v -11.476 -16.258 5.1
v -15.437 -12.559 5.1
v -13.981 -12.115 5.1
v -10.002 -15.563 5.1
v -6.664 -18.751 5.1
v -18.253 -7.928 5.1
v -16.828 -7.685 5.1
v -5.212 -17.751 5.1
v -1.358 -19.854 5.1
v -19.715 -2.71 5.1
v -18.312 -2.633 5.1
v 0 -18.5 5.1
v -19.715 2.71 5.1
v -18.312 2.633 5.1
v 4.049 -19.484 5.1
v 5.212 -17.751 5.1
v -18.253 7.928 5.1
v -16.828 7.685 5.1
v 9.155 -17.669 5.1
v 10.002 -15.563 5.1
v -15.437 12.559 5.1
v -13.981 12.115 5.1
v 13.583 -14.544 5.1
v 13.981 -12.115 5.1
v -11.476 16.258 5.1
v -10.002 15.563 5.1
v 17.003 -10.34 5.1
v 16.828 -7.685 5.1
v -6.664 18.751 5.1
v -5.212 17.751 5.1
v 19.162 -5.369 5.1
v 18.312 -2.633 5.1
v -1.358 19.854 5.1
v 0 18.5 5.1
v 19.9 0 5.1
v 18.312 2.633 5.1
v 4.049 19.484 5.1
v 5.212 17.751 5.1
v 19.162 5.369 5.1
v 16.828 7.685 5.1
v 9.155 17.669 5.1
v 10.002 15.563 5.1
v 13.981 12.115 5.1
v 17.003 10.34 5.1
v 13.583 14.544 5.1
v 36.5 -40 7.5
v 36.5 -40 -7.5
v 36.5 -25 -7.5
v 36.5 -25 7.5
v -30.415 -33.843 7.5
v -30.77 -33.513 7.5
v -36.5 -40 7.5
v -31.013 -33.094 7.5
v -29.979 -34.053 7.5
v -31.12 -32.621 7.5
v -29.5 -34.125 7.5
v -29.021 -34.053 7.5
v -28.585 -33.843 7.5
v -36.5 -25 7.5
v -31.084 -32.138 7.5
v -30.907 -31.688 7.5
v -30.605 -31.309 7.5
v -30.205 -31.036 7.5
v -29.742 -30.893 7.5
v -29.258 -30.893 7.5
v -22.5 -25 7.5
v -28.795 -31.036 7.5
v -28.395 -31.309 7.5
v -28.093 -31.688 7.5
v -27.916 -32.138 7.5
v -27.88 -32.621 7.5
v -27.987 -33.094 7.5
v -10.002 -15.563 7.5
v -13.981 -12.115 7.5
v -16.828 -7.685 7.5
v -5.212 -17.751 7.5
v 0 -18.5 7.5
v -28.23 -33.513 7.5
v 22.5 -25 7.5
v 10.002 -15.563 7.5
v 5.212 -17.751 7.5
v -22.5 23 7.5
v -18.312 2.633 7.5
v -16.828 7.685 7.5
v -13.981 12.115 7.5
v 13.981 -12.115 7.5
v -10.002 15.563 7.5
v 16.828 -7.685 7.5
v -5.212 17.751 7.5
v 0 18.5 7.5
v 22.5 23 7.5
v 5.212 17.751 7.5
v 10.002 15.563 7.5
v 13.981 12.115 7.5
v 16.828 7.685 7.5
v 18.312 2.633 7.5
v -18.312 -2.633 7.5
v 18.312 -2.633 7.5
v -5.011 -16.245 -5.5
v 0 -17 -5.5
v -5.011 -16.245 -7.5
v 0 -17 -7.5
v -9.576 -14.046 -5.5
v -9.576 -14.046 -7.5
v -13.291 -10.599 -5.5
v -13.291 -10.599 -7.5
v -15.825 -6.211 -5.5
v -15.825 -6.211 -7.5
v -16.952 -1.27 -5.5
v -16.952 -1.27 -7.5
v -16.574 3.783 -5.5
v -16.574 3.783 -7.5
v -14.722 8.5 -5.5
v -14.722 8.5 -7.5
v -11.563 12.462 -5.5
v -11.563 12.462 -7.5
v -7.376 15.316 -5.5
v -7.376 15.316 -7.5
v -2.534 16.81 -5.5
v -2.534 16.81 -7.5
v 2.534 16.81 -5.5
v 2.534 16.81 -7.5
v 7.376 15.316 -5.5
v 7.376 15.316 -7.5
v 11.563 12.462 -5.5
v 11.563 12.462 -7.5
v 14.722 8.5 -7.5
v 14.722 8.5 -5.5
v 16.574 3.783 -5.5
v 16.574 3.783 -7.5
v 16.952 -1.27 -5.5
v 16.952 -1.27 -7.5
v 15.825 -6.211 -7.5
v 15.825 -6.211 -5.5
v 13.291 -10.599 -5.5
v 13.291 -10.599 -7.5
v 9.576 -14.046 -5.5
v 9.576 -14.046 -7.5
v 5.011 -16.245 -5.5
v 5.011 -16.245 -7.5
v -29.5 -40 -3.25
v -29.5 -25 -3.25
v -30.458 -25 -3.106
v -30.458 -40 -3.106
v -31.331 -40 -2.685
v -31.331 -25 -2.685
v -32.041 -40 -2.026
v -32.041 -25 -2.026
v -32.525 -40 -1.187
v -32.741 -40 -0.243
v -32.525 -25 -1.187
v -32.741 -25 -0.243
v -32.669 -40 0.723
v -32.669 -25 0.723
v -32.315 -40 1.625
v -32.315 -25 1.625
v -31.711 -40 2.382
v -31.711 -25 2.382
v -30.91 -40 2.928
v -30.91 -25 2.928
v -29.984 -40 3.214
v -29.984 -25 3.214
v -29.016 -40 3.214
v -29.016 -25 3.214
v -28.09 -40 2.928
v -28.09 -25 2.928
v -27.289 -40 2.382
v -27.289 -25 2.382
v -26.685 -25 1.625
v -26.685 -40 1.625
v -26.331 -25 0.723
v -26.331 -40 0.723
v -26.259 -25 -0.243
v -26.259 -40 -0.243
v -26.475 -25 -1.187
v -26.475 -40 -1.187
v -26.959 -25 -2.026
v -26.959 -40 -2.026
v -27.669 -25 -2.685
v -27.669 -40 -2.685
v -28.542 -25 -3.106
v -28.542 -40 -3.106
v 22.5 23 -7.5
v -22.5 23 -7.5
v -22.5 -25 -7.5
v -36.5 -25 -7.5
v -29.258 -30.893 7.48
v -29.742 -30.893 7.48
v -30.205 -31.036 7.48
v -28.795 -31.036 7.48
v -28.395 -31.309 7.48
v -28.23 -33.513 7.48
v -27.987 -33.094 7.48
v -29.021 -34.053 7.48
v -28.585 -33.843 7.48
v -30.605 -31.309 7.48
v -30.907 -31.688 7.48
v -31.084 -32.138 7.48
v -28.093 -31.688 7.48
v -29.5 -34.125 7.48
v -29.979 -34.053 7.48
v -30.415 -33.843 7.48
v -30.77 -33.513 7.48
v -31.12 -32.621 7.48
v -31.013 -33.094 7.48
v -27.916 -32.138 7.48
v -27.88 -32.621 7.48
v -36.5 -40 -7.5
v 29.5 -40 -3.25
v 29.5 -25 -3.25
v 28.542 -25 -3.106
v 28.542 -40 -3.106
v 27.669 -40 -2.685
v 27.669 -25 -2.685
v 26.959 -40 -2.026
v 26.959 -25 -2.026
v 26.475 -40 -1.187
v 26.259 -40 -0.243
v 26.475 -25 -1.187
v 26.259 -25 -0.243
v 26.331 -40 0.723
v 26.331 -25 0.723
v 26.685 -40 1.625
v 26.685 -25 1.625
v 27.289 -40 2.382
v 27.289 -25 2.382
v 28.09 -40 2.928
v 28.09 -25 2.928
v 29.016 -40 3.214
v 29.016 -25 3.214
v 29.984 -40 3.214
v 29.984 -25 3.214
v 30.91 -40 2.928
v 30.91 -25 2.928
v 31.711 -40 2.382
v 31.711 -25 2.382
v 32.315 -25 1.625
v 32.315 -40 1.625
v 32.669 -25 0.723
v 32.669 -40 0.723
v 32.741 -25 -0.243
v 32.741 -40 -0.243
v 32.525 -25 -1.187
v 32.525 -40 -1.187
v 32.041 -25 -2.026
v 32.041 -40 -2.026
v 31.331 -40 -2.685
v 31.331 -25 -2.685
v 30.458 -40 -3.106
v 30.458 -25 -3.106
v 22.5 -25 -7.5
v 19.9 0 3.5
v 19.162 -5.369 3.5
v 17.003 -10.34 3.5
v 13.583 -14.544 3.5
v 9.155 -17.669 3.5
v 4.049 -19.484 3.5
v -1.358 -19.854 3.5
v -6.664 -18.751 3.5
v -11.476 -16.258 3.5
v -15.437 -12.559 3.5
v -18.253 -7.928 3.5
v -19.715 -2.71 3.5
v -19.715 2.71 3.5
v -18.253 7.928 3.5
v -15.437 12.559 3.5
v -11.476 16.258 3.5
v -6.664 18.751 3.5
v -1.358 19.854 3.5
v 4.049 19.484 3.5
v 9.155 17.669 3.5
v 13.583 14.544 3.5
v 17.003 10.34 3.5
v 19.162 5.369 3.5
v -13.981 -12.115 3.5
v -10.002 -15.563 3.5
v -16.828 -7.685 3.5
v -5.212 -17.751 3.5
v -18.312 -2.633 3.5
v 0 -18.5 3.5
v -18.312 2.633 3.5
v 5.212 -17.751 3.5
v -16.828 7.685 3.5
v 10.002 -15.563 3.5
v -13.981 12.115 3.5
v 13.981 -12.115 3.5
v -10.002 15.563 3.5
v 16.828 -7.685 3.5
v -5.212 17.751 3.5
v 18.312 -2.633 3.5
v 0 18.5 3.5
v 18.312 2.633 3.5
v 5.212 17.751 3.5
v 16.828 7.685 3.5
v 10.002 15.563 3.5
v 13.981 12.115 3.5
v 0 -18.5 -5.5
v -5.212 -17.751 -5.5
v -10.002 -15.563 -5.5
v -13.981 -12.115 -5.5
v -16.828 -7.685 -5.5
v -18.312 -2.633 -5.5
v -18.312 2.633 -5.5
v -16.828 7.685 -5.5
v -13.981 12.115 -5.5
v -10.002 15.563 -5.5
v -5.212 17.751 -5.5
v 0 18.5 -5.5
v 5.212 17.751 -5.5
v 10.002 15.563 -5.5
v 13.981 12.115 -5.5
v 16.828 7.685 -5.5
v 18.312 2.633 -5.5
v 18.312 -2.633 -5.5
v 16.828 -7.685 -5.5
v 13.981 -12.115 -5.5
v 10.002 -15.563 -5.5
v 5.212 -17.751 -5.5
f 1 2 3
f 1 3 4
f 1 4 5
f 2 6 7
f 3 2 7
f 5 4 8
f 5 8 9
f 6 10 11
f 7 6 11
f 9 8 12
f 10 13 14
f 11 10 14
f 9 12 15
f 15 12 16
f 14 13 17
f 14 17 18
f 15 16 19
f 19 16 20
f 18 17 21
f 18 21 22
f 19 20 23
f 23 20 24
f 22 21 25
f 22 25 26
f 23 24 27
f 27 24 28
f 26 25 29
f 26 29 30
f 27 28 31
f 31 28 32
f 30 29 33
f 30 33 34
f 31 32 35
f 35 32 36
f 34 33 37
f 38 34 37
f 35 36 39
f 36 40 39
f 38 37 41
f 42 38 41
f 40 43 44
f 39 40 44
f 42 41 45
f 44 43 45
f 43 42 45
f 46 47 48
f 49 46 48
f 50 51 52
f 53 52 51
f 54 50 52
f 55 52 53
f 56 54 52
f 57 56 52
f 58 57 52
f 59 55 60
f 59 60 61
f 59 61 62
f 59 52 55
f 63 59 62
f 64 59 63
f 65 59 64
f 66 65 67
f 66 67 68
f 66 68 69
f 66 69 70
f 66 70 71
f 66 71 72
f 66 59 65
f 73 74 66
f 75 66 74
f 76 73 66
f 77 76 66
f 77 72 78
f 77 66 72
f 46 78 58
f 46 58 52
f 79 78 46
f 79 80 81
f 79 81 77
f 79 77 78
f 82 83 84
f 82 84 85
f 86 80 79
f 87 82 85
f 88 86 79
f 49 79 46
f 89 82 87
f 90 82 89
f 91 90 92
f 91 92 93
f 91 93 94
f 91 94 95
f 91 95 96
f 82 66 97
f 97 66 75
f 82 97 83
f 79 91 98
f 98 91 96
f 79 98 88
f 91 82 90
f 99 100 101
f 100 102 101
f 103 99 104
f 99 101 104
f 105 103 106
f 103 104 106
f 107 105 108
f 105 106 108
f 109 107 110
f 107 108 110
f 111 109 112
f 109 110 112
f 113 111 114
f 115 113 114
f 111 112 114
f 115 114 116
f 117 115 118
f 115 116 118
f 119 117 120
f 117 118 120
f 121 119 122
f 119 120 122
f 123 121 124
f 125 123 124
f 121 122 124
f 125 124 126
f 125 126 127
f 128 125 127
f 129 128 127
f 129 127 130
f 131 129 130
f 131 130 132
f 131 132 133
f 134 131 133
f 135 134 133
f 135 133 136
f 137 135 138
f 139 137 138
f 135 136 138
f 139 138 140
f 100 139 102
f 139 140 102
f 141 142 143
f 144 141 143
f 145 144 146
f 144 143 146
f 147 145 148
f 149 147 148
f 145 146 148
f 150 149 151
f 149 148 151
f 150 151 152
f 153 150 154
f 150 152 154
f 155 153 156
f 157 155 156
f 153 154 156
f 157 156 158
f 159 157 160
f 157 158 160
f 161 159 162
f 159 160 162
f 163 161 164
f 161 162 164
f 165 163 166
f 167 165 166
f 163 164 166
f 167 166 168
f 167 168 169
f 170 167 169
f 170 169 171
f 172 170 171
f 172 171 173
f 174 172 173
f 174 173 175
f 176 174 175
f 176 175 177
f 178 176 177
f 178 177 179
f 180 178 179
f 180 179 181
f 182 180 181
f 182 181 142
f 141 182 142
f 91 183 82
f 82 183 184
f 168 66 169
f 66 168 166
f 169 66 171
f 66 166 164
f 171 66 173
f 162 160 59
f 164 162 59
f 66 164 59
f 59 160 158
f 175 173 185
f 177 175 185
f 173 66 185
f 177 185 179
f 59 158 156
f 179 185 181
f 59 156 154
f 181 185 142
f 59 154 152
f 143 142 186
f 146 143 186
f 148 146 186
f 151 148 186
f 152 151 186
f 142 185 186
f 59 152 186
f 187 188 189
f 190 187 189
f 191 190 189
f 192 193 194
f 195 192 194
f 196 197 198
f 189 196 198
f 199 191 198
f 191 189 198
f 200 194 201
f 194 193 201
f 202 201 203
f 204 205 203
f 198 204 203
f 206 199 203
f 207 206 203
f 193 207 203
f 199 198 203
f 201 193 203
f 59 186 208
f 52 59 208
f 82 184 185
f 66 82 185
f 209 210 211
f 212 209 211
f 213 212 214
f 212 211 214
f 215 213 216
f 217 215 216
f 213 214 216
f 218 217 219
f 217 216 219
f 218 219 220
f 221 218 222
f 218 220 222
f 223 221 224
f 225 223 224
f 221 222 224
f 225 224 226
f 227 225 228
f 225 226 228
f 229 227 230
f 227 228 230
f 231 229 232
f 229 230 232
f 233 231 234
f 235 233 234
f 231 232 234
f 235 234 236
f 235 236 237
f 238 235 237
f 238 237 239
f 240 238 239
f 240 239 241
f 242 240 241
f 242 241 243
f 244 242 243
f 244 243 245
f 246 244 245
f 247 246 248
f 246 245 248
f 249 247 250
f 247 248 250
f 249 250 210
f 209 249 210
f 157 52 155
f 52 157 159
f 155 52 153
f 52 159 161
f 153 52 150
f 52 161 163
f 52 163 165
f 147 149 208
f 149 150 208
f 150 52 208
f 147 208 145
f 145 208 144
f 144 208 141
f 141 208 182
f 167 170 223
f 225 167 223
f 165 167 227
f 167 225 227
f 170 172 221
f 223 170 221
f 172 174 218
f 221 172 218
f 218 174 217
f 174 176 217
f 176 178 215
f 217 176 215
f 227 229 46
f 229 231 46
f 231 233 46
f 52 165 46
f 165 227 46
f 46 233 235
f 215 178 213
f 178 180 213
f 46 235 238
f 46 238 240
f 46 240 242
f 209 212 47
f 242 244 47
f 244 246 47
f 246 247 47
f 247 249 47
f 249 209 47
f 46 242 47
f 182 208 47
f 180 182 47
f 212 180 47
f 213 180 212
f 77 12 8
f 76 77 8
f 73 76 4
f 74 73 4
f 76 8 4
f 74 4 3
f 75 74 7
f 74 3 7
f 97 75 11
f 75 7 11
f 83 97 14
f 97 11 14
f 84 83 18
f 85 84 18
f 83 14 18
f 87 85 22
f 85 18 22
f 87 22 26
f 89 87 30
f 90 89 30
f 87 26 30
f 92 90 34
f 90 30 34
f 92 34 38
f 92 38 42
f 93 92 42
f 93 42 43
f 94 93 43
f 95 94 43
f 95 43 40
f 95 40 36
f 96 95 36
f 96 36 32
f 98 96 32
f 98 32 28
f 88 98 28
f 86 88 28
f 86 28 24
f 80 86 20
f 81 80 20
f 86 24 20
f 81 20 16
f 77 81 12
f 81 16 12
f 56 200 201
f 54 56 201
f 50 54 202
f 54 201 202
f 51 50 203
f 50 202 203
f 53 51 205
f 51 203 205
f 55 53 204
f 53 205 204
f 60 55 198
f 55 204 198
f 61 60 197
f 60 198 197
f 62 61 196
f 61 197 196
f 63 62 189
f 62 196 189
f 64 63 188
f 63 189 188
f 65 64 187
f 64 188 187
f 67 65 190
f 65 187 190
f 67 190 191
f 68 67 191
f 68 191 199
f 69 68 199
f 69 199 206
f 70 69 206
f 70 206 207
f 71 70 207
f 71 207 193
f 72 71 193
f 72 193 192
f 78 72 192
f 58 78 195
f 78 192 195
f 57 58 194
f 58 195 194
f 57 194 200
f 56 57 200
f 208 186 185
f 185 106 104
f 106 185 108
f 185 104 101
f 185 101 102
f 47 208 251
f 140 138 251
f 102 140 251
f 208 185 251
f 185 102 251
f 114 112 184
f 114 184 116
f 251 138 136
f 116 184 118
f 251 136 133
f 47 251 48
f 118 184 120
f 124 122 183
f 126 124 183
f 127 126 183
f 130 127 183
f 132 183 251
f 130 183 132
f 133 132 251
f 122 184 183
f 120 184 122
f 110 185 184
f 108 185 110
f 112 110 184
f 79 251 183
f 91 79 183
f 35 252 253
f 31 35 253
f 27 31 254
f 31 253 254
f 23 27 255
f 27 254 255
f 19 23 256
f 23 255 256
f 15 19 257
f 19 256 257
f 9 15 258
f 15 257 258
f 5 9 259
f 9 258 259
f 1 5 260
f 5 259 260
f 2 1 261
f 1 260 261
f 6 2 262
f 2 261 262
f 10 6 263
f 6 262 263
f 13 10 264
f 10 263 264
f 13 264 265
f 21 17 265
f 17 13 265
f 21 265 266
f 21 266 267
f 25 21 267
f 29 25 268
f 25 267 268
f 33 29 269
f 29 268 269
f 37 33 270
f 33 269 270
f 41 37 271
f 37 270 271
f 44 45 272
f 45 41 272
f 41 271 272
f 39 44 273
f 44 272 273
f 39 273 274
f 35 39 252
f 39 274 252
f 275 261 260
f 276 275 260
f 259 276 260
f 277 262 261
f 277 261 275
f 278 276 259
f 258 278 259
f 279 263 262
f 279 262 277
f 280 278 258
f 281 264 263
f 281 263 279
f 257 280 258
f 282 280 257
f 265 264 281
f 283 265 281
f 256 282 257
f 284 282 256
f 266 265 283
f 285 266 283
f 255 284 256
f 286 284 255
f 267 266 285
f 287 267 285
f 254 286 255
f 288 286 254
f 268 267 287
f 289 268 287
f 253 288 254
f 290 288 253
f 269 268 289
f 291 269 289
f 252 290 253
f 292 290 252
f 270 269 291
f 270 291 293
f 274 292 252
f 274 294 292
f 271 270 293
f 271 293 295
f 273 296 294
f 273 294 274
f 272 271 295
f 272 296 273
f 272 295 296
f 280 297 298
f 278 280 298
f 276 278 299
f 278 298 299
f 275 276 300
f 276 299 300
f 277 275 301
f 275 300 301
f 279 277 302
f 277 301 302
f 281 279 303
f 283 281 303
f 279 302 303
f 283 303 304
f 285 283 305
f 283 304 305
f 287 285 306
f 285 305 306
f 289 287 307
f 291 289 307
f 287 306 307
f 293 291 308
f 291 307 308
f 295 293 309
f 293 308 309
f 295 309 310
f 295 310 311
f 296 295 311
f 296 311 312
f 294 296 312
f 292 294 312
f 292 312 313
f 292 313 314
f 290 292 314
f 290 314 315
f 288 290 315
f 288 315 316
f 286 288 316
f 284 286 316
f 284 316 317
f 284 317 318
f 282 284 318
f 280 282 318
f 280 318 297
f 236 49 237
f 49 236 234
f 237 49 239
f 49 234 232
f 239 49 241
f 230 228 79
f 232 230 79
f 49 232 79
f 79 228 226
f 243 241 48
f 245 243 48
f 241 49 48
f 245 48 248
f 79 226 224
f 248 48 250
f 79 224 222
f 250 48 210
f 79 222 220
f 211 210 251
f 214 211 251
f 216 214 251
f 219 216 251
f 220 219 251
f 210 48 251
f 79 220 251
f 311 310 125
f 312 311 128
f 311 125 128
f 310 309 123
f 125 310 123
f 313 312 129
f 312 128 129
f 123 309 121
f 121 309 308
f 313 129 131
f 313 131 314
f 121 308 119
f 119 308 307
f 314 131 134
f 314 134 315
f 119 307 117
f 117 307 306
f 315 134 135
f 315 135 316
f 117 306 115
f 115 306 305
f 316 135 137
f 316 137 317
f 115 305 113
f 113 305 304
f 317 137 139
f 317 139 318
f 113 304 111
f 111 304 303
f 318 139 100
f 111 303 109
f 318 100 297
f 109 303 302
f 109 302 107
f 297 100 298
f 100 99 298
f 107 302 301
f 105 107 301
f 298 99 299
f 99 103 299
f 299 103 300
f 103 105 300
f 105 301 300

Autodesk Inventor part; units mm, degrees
sketch "Sketch_1" plane through (0, 0, 0) normal (0, 0, 1) x (1, 0, 0)
  line L0 (-36.5, -25) -> (-36.5, -40)
  line L1 (-36.5, -40) -> (36.5, -40)
  line L2 (36.5, -40) -> (36.5, -25)
  line L3 (36.5, -25) -> (22.5, -25)
  line L4 (22.5, -25) -> (22.5, 23)
  line L5 (22.5, 23) -> (-22.5, 23)
  line L6 (-22.5, 23) -> (-22.5, -25)
  line L7 (-22.5, -25) -> (-36.5, -25)
extrude "Extrusion1" add sketch "Sketch_1" along normal mid plane 15
sketch "Sketch2" plane through (0, 0, 7.5) normal (0, 0, 1) x (1, 0, 0)
  point P0 (0, 0)
hole "Hole1" at (0, 0, 7.5) direction (0, 0, -1) diameter 34 depth 15 counterbore diameter 37 counterbore depth 13
sketch "Sketch3" plane through (-36.5, -40, 7.5) normal (0, -1, 0) x (1, 0, 0)
  point P0 (7, -7.5)
hole "Hole2" at (-29.5, -40, 0) direction (0, 1, 0) diameter 6.5 depth 15
sketch "Sketch4" plane through (-36.5, -40, 7.5) normal (0, -1, 0) x (1, 0, 0)
  point P0 (66, -7.5)
hole "Hole3" at (29.5, -40, 0) direction (0, 1, 0) diameter 6.5 depth 15
sketch "Sketch_7" plane through (0, 0, 3.5) normal (0, 0, 1) x (1, 0, 0)
  circle A0 centre (0, 0) radius 19.9
extrude "Extrusion2" cut sketch "Sketch_7" along normal blind 1.6
sketch "Sketch6" plane through (0, 0, 7.5) normal (0, 0, 1) x (1, 0, 0)
  point P0 (-29.5, -32.5)
hole "Hole4" at (-29.5, -32.5, 7.5) direction (0, 0, -1) diameter 3.25 depth 0.02
ref_plane "housing_to_dummy_XY" through (0, 0, 0) normal (1, 0, 0) x (0, 0, -1)
ref_plane "housing_to_dummy_YZ" through (0, 0, 0) normal (0, 0, -1) x (0, 1, 0)
ref_plane "housing_to_dummy_ZX" through (0, 0, 0) normal (0, 1, 0) x (1, 0, 0)
ref_plane "to_bearing_XY" through (0, 0, -5.5) normal (0, 0, 1) x (1, 0, 0)
ref_plane "to_bearing_YZ" through (0, 0, -5.5) normal (1, 0, 0) x (0, 1, 0)
ref_plane "to_bearing_ZX" through (0, 0, -5.5) normal (0, 1, 0) x (0, 0, 1)
ref_plane "to_rring_XY" through (0, 0, 3.5) normal (0, 0, -1) x (1, 0, 0)
ref_plane "to_rring_YZ" through (0, 0, 3.5) normal (1, 0, 0) x (0, -1, 0)
ref_plane "to_rring_ZX" through (0, 0, 3.5) normal (0, -1, 0) x (0, 0, -1)
properties part number "BSHKSA6904ZZ-40_h"
